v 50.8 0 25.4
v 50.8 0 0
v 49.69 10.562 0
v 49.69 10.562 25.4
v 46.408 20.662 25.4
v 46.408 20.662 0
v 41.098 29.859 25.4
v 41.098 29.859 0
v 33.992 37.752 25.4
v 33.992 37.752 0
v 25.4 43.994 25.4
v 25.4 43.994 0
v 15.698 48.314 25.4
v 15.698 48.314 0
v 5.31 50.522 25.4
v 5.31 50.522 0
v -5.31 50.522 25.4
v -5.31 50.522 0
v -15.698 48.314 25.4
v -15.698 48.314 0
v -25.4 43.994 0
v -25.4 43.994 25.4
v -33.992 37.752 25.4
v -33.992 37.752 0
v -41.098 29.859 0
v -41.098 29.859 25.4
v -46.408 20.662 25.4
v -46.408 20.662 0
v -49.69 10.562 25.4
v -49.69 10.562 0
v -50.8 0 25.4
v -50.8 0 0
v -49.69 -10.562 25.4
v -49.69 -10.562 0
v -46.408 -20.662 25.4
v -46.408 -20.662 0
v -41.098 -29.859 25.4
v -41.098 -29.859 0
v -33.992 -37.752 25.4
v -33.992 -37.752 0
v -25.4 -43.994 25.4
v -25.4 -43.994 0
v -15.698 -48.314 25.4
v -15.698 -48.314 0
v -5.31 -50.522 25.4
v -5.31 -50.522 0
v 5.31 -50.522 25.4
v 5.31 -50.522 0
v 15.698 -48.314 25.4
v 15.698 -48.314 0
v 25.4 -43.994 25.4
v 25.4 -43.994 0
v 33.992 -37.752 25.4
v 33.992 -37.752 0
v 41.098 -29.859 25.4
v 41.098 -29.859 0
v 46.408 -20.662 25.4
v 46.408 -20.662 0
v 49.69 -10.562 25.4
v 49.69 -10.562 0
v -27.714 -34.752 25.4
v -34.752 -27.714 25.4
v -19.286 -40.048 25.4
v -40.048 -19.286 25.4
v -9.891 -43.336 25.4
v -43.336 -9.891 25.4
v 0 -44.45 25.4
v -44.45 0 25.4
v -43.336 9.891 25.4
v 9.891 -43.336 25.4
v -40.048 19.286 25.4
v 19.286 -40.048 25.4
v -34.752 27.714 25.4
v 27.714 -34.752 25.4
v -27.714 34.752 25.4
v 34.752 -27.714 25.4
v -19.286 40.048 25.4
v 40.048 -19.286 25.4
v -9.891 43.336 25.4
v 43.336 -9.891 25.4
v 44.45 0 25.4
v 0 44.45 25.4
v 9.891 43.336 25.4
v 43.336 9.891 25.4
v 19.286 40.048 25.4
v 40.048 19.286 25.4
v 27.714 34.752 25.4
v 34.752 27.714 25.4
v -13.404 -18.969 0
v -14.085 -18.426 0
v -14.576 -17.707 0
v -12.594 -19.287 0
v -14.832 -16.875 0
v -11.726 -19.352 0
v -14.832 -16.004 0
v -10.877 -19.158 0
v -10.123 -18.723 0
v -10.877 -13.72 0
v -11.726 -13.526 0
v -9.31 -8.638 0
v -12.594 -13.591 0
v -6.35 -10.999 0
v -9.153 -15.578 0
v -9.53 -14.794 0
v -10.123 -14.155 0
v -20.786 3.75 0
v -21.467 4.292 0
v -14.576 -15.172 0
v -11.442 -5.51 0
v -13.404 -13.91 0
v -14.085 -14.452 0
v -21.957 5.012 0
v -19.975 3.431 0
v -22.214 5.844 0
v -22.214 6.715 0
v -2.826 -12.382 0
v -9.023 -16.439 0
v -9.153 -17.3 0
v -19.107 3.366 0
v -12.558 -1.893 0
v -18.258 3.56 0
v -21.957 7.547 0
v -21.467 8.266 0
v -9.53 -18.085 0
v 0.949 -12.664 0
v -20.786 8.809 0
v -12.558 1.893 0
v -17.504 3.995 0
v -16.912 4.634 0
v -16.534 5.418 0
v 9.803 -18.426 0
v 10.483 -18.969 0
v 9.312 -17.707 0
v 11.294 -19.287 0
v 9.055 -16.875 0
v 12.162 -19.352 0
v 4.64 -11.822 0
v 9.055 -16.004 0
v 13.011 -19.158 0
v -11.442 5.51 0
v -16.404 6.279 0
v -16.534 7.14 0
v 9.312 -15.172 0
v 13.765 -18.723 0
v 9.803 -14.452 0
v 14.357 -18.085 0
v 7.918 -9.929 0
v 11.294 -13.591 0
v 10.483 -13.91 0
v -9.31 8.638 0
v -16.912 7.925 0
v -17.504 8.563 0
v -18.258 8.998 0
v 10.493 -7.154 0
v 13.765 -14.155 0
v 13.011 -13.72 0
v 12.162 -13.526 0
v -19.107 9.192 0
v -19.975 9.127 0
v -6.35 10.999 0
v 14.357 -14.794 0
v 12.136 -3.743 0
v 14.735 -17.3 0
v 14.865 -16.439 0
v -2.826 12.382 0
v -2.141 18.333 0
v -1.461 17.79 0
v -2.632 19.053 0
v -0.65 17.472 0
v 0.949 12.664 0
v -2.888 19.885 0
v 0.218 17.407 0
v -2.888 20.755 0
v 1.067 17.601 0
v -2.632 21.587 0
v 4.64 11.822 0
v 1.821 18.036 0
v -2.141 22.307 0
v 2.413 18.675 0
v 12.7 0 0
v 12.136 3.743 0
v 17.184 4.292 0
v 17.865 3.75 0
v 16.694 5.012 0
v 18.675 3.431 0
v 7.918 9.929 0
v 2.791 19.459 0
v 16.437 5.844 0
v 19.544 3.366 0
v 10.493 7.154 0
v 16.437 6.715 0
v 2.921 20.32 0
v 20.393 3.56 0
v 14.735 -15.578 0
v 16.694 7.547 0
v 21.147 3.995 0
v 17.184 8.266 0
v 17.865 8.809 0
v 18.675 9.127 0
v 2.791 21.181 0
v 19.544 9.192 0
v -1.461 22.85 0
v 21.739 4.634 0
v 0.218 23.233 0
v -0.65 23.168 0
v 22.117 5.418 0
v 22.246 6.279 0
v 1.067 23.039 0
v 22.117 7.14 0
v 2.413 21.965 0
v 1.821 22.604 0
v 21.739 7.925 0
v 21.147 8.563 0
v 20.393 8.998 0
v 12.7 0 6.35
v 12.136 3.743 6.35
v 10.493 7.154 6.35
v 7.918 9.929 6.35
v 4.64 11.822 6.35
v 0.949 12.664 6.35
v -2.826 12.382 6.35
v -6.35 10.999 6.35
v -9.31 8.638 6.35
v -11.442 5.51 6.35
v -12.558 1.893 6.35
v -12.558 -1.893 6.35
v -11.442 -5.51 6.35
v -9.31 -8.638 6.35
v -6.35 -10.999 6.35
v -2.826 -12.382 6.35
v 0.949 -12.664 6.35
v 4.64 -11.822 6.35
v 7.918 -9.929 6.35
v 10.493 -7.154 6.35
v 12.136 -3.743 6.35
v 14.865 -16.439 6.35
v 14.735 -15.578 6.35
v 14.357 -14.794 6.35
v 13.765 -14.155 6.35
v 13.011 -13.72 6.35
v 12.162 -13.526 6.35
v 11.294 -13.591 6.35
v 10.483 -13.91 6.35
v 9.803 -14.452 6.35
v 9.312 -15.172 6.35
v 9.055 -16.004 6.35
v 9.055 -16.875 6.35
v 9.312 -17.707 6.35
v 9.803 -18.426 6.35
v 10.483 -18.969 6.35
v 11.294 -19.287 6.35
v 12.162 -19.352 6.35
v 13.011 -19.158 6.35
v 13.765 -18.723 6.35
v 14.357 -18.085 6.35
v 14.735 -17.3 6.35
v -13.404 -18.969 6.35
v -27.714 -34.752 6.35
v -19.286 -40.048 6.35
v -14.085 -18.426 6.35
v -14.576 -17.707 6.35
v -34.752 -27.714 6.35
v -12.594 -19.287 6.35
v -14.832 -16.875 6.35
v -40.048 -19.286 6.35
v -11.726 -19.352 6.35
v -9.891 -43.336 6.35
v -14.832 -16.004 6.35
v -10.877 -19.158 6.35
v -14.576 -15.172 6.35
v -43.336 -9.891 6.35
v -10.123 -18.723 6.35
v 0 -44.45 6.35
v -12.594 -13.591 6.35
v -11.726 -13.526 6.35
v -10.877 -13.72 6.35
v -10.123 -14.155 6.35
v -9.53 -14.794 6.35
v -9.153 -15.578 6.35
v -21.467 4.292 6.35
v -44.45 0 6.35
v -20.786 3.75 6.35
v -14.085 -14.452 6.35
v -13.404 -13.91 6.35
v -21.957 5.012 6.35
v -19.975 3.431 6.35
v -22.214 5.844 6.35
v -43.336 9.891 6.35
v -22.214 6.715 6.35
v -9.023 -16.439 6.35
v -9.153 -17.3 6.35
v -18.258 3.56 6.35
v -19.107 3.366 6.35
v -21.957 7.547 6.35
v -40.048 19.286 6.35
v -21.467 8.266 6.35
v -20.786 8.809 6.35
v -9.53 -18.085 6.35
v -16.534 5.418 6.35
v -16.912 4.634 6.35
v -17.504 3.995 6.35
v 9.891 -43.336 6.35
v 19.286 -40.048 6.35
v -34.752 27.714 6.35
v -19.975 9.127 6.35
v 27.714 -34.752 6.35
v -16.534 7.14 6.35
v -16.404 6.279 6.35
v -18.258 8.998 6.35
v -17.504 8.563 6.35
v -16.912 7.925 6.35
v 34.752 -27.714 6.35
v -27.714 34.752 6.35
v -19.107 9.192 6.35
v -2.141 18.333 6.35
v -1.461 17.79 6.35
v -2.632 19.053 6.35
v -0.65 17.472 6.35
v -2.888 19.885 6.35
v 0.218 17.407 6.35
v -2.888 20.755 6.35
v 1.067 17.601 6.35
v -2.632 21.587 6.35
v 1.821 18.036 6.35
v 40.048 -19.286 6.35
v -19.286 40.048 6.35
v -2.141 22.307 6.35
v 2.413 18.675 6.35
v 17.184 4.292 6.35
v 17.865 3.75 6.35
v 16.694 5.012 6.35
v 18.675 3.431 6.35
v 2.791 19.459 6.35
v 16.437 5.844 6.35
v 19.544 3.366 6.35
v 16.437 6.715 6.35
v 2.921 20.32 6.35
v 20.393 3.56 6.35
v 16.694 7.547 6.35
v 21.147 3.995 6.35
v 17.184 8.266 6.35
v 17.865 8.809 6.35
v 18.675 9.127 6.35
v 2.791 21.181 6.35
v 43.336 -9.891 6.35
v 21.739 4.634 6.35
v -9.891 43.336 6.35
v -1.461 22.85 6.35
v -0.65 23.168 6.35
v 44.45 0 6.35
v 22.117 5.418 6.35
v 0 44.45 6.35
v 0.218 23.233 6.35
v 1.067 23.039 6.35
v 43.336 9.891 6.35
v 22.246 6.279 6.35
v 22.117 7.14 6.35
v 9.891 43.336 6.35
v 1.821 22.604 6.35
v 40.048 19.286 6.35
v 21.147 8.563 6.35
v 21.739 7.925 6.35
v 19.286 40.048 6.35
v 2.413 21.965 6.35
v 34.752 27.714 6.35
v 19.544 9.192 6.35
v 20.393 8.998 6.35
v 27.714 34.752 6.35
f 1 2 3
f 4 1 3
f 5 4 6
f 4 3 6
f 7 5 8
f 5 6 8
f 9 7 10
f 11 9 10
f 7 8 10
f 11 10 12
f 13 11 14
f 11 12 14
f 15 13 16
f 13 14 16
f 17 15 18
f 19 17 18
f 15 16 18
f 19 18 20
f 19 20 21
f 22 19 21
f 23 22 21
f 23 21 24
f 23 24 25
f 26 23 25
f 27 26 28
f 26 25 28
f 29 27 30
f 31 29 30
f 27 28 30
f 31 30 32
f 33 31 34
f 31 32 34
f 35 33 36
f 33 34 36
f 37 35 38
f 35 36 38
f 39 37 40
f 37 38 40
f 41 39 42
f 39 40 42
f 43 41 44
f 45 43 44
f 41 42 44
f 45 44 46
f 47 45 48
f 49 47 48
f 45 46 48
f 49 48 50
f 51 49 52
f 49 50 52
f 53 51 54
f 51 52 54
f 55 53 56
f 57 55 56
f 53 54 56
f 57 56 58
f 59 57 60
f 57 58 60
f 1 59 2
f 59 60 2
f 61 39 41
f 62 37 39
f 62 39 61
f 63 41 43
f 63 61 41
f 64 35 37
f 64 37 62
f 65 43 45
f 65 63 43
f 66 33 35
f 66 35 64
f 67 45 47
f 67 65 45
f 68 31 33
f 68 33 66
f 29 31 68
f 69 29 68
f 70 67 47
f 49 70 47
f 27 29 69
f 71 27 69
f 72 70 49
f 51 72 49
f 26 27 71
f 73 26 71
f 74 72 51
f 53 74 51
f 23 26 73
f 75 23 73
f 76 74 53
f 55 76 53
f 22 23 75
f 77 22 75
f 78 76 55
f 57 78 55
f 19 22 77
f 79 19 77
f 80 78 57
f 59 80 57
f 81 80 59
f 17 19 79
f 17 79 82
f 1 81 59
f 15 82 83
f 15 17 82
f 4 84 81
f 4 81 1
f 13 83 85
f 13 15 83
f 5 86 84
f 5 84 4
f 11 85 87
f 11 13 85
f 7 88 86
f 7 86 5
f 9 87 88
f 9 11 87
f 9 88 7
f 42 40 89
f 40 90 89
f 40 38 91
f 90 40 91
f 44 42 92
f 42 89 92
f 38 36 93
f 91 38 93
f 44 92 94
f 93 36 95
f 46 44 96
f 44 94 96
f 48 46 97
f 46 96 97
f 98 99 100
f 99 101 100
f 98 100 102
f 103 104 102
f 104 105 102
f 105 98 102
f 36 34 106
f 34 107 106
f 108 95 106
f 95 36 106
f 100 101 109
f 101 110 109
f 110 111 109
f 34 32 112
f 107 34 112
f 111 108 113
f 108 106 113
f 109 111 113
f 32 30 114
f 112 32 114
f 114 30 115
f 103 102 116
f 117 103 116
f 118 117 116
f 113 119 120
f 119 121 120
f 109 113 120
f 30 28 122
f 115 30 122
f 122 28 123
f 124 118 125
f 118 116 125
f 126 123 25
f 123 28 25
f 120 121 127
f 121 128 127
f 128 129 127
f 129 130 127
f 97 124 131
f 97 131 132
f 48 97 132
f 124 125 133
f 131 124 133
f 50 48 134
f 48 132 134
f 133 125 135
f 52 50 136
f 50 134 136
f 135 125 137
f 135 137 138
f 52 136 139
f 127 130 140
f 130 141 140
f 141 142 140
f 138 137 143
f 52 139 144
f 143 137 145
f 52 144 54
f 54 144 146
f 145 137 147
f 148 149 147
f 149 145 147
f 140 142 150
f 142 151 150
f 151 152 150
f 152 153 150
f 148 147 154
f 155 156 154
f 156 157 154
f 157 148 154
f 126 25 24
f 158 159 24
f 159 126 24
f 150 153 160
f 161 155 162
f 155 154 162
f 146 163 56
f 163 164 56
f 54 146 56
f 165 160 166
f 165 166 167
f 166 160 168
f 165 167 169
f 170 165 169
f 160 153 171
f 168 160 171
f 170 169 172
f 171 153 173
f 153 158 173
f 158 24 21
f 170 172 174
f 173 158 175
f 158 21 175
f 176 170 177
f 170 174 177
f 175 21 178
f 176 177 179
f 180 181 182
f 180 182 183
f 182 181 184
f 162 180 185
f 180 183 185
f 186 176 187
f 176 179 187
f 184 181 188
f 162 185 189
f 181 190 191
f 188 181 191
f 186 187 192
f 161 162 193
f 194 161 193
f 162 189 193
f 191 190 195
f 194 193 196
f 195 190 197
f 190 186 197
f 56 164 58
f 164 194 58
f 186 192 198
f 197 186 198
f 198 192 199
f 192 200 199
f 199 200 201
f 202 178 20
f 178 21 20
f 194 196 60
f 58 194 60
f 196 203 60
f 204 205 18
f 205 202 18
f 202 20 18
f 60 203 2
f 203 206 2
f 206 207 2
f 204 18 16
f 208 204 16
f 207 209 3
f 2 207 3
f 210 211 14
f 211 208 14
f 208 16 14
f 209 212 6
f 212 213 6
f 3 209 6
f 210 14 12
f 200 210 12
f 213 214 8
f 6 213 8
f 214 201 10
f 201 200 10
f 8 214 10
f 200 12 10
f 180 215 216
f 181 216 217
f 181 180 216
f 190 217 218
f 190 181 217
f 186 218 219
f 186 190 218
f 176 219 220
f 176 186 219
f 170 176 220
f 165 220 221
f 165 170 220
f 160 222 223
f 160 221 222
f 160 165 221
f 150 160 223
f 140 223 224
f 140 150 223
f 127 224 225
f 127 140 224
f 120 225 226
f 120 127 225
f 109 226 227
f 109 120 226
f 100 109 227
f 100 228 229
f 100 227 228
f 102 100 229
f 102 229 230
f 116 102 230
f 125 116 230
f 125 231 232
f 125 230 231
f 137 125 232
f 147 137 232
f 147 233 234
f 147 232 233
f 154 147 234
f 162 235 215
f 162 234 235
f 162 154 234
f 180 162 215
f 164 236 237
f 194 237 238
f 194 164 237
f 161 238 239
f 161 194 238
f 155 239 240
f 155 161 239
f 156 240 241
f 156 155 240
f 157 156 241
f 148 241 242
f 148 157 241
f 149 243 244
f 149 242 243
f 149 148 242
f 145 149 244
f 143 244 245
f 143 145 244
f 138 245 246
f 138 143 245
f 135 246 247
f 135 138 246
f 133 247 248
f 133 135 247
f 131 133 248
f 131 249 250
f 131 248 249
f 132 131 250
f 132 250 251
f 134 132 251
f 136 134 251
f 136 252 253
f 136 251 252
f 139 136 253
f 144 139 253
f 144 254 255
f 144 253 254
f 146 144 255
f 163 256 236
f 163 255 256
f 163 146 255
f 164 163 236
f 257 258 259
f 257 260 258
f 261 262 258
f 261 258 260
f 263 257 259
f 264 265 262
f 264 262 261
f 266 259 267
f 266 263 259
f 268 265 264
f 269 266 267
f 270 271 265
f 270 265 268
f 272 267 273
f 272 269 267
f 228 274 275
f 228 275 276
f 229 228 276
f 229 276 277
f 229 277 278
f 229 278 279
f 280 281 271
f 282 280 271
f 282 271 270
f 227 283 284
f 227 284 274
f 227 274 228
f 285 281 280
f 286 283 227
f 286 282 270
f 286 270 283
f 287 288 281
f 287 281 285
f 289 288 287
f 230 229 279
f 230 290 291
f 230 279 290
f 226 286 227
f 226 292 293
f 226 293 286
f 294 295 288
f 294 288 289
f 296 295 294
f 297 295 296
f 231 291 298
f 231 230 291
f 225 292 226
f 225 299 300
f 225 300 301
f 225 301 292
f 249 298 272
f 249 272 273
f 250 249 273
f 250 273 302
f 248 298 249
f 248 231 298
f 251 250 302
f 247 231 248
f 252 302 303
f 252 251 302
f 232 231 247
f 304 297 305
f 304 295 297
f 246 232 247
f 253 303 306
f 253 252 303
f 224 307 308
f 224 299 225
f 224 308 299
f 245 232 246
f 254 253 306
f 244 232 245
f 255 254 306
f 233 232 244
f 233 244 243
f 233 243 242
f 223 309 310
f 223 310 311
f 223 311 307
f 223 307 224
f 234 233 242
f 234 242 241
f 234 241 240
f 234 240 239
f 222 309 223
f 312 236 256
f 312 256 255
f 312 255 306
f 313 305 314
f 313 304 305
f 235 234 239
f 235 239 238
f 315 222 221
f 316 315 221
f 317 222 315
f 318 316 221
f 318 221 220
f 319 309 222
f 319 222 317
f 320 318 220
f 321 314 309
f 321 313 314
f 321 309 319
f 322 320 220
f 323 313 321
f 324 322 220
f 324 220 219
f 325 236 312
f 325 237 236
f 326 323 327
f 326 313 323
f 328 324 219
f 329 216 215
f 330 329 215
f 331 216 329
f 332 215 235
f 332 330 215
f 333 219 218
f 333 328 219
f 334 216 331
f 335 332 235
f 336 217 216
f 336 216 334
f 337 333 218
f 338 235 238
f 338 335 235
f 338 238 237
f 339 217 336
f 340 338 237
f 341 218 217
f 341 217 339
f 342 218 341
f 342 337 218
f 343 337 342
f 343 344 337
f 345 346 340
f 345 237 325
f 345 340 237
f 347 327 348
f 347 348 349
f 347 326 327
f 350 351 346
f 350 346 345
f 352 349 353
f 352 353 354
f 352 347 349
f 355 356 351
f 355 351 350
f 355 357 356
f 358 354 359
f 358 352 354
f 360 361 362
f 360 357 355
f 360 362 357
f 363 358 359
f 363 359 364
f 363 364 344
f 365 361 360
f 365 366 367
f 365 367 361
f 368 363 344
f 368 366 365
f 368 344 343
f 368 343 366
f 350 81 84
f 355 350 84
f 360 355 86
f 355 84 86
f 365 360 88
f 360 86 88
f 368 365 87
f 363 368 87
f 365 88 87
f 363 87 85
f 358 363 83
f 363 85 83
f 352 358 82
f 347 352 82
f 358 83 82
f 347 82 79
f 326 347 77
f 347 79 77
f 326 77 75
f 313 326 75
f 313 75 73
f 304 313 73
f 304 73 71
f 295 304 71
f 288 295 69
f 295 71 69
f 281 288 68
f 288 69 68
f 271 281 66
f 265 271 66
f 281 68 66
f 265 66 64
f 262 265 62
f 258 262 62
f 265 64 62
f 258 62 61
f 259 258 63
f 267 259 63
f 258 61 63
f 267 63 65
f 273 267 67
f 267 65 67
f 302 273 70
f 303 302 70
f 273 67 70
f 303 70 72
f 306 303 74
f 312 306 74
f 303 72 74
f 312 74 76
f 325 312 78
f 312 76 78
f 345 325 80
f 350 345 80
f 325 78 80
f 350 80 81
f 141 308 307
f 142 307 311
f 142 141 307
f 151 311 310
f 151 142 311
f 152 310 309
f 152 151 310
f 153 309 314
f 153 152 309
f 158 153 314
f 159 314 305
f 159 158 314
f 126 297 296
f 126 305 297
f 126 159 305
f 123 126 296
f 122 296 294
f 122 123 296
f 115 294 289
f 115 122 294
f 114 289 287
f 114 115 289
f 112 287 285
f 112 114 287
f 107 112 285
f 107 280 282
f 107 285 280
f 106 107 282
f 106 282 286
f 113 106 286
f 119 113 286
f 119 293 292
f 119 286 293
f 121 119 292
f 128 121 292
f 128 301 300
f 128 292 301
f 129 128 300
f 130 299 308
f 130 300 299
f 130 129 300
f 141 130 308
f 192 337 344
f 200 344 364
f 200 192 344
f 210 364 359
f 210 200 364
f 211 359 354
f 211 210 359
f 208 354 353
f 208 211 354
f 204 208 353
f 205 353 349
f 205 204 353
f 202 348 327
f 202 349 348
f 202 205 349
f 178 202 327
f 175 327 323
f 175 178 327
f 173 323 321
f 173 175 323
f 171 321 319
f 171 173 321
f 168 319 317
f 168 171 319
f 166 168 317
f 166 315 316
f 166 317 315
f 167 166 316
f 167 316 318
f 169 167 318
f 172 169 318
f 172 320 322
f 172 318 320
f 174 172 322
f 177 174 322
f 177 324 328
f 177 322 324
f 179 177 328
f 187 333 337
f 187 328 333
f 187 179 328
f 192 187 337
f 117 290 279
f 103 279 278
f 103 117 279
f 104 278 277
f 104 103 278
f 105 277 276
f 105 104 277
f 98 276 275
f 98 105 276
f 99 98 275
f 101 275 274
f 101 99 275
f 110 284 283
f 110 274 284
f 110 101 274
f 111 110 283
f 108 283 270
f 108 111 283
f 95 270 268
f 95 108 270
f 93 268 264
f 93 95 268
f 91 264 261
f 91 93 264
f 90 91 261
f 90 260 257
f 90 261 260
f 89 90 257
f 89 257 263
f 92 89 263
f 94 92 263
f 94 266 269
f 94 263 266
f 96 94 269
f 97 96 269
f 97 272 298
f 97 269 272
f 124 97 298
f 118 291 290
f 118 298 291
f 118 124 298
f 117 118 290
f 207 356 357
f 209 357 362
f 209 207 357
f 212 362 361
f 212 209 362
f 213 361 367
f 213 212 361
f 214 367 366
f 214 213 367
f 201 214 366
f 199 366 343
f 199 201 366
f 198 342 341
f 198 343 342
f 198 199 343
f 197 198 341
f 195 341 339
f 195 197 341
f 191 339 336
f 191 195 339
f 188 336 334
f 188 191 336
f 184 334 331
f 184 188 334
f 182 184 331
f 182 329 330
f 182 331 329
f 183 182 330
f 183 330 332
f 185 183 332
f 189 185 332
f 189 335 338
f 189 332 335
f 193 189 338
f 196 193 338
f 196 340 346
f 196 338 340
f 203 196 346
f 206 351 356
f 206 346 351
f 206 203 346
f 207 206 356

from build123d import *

# Parameters (mm, degrees)
SKETCH1_R           = 50.8
SKETCH1_R_2         = 12.7
SKETCH1_R_3         = 2.921
BOSS_EXTRUDE2_DEPTH = 25.4
SKETCH2_R           = 44.45
CUT_EXTRUDE1_DEPTH  = 19.05


with BuildPart() as part:
    # Sketch1 → Boss-Extrude2 (new body)
    with BuildSketch(Plane.XY):
        Circle(SKETCH1_R)
        Circle(SKETCH1_R_2, mode=Mode.SUBTRACT)
        with Locations((0, 20.32)):
            Circle(SKETCH1_R_3, mode=Mode.SUBTRACT)
        with Locations((19.325468411, 6.279225326)):
            Circle(SKETCH1_R_3, mode=Mode.SUBTRACT)
        with Locations((11.943796327, -16.439225326)):
            Circle(SKETCH1_R_3, mode=Mode.SUBTRACT)
        with Locations((-11.943796327, -16.439225326)):
            Circle(SKETCH1_R_3, mode=Mode.SUBTRACT)
        with Locations((-19.325468411, 6.279225326)):
            Circle(SKETCH1_R_3, mode=Mode.SUBTRACT)
    extrude(amount=BOSS_EXTRUDE2_DEPTH)

    # Sketch2 → Cut-Extrude1 (cut)
    with BuildSketch(Plane.XY.offset(25.4)):
        Circle(SKETCH2_R)
    extrude(amount=-CUT_EXTRUDE1_DEPTH, mode=Mode.SUBTRACT)


solid = part.part
